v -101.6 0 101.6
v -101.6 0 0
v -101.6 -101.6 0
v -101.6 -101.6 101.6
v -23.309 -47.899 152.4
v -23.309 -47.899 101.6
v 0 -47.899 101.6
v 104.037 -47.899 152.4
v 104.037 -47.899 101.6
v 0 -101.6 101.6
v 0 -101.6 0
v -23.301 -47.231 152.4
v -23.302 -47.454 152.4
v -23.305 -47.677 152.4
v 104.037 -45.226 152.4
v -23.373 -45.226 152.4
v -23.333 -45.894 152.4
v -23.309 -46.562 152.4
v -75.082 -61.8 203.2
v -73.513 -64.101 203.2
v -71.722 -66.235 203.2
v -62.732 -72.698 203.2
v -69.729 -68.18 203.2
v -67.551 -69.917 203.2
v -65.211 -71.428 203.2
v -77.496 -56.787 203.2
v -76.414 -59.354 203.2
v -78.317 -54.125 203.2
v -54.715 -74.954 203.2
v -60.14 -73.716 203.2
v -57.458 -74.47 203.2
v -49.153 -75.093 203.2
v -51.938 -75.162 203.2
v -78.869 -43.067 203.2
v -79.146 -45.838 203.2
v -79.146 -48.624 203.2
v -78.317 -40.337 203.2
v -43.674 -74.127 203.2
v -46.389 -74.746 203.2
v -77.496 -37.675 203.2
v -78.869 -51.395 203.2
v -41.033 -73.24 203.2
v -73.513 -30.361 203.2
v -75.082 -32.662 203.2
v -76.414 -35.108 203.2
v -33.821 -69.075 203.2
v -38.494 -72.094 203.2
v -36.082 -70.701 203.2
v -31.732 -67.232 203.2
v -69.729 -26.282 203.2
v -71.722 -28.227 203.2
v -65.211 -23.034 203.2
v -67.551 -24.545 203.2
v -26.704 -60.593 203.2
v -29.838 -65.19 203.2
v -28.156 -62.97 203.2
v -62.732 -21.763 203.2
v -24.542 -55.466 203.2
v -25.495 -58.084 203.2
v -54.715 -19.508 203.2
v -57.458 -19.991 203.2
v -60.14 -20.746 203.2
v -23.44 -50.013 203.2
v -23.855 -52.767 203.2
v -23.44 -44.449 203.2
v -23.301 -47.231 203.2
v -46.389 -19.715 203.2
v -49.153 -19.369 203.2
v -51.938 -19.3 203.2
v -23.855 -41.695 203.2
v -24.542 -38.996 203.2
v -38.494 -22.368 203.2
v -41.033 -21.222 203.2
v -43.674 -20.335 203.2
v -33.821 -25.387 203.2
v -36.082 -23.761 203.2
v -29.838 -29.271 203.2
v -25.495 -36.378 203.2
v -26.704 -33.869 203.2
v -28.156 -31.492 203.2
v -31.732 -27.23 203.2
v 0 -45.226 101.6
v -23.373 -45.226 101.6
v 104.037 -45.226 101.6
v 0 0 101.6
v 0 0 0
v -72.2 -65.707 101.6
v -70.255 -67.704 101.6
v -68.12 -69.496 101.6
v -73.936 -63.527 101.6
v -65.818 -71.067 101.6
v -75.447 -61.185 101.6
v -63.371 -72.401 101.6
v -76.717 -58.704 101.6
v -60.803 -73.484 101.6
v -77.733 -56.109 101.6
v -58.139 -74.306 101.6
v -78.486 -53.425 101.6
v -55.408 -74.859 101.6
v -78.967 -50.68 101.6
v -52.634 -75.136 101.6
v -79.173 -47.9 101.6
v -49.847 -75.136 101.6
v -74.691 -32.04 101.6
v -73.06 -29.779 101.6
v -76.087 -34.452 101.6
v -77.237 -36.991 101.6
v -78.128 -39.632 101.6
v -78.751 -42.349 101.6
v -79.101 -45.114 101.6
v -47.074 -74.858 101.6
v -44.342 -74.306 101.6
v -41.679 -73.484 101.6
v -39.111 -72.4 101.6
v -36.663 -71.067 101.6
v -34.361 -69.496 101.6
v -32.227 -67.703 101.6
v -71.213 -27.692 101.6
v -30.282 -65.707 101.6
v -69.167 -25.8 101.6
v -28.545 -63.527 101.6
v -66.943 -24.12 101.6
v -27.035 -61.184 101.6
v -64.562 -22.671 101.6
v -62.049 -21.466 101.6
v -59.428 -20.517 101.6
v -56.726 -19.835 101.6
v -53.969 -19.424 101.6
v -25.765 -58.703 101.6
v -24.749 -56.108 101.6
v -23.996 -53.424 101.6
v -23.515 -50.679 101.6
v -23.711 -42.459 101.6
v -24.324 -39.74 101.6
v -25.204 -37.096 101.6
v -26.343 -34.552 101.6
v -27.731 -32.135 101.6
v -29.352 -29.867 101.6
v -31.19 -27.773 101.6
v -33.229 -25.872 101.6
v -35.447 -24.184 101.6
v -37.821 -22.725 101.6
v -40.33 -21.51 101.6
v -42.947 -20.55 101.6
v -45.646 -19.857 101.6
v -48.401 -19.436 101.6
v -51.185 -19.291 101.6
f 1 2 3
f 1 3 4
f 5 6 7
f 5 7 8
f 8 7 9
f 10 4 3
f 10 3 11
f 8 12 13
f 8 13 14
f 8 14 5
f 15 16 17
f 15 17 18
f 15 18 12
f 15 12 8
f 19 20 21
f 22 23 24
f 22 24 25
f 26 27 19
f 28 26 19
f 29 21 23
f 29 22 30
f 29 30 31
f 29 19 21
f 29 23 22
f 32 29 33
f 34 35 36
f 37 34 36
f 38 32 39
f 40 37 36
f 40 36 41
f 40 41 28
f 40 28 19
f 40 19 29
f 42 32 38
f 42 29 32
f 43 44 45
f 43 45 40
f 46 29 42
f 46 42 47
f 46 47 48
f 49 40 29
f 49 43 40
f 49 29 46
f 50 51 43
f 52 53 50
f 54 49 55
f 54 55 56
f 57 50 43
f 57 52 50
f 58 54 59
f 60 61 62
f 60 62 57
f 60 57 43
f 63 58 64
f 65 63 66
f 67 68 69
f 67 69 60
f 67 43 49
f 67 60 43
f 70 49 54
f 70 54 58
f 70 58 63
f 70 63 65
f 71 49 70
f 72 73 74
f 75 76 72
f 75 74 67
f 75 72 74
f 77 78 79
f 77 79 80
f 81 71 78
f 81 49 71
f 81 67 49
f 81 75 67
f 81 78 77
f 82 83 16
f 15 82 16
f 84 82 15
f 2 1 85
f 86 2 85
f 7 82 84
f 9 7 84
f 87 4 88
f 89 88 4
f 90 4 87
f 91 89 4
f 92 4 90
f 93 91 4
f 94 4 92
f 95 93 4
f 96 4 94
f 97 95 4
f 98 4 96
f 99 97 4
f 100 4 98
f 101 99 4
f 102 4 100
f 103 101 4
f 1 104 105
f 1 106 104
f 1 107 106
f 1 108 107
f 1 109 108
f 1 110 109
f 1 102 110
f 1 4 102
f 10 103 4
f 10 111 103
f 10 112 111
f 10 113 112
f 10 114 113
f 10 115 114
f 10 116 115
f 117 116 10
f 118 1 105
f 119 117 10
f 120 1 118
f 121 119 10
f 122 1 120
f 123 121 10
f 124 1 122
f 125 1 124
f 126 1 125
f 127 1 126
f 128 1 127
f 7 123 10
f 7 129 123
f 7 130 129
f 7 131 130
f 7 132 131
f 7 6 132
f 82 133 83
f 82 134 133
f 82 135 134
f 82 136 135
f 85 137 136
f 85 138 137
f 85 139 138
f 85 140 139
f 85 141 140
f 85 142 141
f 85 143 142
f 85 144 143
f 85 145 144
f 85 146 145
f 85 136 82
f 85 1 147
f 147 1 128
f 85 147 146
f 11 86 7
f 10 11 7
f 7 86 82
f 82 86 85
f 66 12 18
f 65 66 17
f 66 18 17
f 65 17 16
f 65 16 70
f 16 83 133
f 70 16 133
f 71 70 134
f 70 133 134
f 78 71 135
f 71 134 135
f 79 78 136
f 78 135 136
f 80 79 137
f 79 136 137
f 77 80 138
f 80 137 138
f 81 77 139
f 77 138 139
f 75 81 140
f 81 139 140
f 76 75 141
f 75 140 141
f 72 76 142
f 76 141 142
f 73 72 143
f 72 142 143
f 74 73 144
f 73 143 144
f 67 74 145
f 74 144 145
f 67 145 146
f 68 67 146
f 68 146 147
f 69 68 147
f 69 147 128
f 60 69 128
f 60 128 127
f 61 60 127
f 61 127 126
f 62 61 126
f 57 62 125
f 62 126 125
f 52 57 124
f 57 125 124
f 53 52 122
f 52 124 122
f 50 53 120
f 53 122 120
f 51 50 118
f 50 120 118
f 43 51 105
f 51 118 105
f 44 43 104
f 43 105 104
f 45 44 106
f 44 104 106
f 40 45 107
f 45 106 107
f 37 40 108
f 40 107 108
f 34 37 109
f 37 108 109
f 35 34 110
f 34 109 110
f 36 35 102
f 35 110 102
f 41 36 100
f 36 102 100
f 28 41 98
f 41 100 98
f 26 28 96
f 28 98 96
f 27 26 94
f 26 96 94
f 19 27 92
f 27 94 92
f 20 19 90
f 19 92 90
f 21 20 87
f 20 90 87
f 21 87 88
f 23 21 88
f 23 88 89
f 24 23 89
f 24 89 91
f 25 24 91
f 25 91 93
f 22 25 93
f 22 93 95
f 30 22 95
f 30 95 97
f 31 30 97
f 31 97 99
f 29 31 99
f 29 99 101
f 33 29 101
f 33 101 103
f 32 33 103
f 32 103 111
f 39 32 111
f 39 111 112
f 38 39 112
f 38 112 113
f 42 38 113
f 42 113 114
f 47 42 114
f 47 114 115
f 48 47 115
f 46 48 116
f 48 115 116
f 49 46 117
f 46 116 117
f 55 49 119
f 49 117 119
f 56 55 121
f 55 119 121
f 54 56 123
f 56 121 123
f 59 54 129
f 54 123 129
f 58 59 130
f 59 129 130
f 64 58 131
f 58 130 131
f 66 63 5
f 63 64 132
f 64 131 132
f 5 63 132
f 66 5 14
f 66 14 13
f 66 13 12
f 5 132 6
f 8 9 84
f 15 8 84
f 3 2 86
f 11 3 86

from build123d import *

# Parameters (mm, degrees)
F0_W     = 101.6
F0_H     = 101.6
F1_DEPTH = 101.6
F2_R     = 27.94
F3_DEPTH = 101.6
F5_W     = 156.614647
F5_H     = 2.673365
F6_DEPTH = 50.8


with BuildPart() as f1:
    # F0 (on Front) → F1 (new body)
    with BuildSketch(Plane.XZ):
        with Locations((-50.8, 50.8)):
            Rectangle(F0_W, F0_H)
    extrude(amount=F1_DEPTH)

    # F2 (on face) → F3 (join)
    with BuildSketch(Plane.XY.offset(101.6)):
        with Locations((-51.241014, -47.230963)):
            Circle(F2_R)
    extrude(amount=F3_DEPTH)

    # F5 (on face) → F6 (join)
    with BuildSketch(Plane.XY.offset(101.6)):
        with Locations((25.729626, -46.562624)):
            Rectangle(F5_W, F5_H)
    extrude(amount=F6_DEPTH)


solid = f1.part
